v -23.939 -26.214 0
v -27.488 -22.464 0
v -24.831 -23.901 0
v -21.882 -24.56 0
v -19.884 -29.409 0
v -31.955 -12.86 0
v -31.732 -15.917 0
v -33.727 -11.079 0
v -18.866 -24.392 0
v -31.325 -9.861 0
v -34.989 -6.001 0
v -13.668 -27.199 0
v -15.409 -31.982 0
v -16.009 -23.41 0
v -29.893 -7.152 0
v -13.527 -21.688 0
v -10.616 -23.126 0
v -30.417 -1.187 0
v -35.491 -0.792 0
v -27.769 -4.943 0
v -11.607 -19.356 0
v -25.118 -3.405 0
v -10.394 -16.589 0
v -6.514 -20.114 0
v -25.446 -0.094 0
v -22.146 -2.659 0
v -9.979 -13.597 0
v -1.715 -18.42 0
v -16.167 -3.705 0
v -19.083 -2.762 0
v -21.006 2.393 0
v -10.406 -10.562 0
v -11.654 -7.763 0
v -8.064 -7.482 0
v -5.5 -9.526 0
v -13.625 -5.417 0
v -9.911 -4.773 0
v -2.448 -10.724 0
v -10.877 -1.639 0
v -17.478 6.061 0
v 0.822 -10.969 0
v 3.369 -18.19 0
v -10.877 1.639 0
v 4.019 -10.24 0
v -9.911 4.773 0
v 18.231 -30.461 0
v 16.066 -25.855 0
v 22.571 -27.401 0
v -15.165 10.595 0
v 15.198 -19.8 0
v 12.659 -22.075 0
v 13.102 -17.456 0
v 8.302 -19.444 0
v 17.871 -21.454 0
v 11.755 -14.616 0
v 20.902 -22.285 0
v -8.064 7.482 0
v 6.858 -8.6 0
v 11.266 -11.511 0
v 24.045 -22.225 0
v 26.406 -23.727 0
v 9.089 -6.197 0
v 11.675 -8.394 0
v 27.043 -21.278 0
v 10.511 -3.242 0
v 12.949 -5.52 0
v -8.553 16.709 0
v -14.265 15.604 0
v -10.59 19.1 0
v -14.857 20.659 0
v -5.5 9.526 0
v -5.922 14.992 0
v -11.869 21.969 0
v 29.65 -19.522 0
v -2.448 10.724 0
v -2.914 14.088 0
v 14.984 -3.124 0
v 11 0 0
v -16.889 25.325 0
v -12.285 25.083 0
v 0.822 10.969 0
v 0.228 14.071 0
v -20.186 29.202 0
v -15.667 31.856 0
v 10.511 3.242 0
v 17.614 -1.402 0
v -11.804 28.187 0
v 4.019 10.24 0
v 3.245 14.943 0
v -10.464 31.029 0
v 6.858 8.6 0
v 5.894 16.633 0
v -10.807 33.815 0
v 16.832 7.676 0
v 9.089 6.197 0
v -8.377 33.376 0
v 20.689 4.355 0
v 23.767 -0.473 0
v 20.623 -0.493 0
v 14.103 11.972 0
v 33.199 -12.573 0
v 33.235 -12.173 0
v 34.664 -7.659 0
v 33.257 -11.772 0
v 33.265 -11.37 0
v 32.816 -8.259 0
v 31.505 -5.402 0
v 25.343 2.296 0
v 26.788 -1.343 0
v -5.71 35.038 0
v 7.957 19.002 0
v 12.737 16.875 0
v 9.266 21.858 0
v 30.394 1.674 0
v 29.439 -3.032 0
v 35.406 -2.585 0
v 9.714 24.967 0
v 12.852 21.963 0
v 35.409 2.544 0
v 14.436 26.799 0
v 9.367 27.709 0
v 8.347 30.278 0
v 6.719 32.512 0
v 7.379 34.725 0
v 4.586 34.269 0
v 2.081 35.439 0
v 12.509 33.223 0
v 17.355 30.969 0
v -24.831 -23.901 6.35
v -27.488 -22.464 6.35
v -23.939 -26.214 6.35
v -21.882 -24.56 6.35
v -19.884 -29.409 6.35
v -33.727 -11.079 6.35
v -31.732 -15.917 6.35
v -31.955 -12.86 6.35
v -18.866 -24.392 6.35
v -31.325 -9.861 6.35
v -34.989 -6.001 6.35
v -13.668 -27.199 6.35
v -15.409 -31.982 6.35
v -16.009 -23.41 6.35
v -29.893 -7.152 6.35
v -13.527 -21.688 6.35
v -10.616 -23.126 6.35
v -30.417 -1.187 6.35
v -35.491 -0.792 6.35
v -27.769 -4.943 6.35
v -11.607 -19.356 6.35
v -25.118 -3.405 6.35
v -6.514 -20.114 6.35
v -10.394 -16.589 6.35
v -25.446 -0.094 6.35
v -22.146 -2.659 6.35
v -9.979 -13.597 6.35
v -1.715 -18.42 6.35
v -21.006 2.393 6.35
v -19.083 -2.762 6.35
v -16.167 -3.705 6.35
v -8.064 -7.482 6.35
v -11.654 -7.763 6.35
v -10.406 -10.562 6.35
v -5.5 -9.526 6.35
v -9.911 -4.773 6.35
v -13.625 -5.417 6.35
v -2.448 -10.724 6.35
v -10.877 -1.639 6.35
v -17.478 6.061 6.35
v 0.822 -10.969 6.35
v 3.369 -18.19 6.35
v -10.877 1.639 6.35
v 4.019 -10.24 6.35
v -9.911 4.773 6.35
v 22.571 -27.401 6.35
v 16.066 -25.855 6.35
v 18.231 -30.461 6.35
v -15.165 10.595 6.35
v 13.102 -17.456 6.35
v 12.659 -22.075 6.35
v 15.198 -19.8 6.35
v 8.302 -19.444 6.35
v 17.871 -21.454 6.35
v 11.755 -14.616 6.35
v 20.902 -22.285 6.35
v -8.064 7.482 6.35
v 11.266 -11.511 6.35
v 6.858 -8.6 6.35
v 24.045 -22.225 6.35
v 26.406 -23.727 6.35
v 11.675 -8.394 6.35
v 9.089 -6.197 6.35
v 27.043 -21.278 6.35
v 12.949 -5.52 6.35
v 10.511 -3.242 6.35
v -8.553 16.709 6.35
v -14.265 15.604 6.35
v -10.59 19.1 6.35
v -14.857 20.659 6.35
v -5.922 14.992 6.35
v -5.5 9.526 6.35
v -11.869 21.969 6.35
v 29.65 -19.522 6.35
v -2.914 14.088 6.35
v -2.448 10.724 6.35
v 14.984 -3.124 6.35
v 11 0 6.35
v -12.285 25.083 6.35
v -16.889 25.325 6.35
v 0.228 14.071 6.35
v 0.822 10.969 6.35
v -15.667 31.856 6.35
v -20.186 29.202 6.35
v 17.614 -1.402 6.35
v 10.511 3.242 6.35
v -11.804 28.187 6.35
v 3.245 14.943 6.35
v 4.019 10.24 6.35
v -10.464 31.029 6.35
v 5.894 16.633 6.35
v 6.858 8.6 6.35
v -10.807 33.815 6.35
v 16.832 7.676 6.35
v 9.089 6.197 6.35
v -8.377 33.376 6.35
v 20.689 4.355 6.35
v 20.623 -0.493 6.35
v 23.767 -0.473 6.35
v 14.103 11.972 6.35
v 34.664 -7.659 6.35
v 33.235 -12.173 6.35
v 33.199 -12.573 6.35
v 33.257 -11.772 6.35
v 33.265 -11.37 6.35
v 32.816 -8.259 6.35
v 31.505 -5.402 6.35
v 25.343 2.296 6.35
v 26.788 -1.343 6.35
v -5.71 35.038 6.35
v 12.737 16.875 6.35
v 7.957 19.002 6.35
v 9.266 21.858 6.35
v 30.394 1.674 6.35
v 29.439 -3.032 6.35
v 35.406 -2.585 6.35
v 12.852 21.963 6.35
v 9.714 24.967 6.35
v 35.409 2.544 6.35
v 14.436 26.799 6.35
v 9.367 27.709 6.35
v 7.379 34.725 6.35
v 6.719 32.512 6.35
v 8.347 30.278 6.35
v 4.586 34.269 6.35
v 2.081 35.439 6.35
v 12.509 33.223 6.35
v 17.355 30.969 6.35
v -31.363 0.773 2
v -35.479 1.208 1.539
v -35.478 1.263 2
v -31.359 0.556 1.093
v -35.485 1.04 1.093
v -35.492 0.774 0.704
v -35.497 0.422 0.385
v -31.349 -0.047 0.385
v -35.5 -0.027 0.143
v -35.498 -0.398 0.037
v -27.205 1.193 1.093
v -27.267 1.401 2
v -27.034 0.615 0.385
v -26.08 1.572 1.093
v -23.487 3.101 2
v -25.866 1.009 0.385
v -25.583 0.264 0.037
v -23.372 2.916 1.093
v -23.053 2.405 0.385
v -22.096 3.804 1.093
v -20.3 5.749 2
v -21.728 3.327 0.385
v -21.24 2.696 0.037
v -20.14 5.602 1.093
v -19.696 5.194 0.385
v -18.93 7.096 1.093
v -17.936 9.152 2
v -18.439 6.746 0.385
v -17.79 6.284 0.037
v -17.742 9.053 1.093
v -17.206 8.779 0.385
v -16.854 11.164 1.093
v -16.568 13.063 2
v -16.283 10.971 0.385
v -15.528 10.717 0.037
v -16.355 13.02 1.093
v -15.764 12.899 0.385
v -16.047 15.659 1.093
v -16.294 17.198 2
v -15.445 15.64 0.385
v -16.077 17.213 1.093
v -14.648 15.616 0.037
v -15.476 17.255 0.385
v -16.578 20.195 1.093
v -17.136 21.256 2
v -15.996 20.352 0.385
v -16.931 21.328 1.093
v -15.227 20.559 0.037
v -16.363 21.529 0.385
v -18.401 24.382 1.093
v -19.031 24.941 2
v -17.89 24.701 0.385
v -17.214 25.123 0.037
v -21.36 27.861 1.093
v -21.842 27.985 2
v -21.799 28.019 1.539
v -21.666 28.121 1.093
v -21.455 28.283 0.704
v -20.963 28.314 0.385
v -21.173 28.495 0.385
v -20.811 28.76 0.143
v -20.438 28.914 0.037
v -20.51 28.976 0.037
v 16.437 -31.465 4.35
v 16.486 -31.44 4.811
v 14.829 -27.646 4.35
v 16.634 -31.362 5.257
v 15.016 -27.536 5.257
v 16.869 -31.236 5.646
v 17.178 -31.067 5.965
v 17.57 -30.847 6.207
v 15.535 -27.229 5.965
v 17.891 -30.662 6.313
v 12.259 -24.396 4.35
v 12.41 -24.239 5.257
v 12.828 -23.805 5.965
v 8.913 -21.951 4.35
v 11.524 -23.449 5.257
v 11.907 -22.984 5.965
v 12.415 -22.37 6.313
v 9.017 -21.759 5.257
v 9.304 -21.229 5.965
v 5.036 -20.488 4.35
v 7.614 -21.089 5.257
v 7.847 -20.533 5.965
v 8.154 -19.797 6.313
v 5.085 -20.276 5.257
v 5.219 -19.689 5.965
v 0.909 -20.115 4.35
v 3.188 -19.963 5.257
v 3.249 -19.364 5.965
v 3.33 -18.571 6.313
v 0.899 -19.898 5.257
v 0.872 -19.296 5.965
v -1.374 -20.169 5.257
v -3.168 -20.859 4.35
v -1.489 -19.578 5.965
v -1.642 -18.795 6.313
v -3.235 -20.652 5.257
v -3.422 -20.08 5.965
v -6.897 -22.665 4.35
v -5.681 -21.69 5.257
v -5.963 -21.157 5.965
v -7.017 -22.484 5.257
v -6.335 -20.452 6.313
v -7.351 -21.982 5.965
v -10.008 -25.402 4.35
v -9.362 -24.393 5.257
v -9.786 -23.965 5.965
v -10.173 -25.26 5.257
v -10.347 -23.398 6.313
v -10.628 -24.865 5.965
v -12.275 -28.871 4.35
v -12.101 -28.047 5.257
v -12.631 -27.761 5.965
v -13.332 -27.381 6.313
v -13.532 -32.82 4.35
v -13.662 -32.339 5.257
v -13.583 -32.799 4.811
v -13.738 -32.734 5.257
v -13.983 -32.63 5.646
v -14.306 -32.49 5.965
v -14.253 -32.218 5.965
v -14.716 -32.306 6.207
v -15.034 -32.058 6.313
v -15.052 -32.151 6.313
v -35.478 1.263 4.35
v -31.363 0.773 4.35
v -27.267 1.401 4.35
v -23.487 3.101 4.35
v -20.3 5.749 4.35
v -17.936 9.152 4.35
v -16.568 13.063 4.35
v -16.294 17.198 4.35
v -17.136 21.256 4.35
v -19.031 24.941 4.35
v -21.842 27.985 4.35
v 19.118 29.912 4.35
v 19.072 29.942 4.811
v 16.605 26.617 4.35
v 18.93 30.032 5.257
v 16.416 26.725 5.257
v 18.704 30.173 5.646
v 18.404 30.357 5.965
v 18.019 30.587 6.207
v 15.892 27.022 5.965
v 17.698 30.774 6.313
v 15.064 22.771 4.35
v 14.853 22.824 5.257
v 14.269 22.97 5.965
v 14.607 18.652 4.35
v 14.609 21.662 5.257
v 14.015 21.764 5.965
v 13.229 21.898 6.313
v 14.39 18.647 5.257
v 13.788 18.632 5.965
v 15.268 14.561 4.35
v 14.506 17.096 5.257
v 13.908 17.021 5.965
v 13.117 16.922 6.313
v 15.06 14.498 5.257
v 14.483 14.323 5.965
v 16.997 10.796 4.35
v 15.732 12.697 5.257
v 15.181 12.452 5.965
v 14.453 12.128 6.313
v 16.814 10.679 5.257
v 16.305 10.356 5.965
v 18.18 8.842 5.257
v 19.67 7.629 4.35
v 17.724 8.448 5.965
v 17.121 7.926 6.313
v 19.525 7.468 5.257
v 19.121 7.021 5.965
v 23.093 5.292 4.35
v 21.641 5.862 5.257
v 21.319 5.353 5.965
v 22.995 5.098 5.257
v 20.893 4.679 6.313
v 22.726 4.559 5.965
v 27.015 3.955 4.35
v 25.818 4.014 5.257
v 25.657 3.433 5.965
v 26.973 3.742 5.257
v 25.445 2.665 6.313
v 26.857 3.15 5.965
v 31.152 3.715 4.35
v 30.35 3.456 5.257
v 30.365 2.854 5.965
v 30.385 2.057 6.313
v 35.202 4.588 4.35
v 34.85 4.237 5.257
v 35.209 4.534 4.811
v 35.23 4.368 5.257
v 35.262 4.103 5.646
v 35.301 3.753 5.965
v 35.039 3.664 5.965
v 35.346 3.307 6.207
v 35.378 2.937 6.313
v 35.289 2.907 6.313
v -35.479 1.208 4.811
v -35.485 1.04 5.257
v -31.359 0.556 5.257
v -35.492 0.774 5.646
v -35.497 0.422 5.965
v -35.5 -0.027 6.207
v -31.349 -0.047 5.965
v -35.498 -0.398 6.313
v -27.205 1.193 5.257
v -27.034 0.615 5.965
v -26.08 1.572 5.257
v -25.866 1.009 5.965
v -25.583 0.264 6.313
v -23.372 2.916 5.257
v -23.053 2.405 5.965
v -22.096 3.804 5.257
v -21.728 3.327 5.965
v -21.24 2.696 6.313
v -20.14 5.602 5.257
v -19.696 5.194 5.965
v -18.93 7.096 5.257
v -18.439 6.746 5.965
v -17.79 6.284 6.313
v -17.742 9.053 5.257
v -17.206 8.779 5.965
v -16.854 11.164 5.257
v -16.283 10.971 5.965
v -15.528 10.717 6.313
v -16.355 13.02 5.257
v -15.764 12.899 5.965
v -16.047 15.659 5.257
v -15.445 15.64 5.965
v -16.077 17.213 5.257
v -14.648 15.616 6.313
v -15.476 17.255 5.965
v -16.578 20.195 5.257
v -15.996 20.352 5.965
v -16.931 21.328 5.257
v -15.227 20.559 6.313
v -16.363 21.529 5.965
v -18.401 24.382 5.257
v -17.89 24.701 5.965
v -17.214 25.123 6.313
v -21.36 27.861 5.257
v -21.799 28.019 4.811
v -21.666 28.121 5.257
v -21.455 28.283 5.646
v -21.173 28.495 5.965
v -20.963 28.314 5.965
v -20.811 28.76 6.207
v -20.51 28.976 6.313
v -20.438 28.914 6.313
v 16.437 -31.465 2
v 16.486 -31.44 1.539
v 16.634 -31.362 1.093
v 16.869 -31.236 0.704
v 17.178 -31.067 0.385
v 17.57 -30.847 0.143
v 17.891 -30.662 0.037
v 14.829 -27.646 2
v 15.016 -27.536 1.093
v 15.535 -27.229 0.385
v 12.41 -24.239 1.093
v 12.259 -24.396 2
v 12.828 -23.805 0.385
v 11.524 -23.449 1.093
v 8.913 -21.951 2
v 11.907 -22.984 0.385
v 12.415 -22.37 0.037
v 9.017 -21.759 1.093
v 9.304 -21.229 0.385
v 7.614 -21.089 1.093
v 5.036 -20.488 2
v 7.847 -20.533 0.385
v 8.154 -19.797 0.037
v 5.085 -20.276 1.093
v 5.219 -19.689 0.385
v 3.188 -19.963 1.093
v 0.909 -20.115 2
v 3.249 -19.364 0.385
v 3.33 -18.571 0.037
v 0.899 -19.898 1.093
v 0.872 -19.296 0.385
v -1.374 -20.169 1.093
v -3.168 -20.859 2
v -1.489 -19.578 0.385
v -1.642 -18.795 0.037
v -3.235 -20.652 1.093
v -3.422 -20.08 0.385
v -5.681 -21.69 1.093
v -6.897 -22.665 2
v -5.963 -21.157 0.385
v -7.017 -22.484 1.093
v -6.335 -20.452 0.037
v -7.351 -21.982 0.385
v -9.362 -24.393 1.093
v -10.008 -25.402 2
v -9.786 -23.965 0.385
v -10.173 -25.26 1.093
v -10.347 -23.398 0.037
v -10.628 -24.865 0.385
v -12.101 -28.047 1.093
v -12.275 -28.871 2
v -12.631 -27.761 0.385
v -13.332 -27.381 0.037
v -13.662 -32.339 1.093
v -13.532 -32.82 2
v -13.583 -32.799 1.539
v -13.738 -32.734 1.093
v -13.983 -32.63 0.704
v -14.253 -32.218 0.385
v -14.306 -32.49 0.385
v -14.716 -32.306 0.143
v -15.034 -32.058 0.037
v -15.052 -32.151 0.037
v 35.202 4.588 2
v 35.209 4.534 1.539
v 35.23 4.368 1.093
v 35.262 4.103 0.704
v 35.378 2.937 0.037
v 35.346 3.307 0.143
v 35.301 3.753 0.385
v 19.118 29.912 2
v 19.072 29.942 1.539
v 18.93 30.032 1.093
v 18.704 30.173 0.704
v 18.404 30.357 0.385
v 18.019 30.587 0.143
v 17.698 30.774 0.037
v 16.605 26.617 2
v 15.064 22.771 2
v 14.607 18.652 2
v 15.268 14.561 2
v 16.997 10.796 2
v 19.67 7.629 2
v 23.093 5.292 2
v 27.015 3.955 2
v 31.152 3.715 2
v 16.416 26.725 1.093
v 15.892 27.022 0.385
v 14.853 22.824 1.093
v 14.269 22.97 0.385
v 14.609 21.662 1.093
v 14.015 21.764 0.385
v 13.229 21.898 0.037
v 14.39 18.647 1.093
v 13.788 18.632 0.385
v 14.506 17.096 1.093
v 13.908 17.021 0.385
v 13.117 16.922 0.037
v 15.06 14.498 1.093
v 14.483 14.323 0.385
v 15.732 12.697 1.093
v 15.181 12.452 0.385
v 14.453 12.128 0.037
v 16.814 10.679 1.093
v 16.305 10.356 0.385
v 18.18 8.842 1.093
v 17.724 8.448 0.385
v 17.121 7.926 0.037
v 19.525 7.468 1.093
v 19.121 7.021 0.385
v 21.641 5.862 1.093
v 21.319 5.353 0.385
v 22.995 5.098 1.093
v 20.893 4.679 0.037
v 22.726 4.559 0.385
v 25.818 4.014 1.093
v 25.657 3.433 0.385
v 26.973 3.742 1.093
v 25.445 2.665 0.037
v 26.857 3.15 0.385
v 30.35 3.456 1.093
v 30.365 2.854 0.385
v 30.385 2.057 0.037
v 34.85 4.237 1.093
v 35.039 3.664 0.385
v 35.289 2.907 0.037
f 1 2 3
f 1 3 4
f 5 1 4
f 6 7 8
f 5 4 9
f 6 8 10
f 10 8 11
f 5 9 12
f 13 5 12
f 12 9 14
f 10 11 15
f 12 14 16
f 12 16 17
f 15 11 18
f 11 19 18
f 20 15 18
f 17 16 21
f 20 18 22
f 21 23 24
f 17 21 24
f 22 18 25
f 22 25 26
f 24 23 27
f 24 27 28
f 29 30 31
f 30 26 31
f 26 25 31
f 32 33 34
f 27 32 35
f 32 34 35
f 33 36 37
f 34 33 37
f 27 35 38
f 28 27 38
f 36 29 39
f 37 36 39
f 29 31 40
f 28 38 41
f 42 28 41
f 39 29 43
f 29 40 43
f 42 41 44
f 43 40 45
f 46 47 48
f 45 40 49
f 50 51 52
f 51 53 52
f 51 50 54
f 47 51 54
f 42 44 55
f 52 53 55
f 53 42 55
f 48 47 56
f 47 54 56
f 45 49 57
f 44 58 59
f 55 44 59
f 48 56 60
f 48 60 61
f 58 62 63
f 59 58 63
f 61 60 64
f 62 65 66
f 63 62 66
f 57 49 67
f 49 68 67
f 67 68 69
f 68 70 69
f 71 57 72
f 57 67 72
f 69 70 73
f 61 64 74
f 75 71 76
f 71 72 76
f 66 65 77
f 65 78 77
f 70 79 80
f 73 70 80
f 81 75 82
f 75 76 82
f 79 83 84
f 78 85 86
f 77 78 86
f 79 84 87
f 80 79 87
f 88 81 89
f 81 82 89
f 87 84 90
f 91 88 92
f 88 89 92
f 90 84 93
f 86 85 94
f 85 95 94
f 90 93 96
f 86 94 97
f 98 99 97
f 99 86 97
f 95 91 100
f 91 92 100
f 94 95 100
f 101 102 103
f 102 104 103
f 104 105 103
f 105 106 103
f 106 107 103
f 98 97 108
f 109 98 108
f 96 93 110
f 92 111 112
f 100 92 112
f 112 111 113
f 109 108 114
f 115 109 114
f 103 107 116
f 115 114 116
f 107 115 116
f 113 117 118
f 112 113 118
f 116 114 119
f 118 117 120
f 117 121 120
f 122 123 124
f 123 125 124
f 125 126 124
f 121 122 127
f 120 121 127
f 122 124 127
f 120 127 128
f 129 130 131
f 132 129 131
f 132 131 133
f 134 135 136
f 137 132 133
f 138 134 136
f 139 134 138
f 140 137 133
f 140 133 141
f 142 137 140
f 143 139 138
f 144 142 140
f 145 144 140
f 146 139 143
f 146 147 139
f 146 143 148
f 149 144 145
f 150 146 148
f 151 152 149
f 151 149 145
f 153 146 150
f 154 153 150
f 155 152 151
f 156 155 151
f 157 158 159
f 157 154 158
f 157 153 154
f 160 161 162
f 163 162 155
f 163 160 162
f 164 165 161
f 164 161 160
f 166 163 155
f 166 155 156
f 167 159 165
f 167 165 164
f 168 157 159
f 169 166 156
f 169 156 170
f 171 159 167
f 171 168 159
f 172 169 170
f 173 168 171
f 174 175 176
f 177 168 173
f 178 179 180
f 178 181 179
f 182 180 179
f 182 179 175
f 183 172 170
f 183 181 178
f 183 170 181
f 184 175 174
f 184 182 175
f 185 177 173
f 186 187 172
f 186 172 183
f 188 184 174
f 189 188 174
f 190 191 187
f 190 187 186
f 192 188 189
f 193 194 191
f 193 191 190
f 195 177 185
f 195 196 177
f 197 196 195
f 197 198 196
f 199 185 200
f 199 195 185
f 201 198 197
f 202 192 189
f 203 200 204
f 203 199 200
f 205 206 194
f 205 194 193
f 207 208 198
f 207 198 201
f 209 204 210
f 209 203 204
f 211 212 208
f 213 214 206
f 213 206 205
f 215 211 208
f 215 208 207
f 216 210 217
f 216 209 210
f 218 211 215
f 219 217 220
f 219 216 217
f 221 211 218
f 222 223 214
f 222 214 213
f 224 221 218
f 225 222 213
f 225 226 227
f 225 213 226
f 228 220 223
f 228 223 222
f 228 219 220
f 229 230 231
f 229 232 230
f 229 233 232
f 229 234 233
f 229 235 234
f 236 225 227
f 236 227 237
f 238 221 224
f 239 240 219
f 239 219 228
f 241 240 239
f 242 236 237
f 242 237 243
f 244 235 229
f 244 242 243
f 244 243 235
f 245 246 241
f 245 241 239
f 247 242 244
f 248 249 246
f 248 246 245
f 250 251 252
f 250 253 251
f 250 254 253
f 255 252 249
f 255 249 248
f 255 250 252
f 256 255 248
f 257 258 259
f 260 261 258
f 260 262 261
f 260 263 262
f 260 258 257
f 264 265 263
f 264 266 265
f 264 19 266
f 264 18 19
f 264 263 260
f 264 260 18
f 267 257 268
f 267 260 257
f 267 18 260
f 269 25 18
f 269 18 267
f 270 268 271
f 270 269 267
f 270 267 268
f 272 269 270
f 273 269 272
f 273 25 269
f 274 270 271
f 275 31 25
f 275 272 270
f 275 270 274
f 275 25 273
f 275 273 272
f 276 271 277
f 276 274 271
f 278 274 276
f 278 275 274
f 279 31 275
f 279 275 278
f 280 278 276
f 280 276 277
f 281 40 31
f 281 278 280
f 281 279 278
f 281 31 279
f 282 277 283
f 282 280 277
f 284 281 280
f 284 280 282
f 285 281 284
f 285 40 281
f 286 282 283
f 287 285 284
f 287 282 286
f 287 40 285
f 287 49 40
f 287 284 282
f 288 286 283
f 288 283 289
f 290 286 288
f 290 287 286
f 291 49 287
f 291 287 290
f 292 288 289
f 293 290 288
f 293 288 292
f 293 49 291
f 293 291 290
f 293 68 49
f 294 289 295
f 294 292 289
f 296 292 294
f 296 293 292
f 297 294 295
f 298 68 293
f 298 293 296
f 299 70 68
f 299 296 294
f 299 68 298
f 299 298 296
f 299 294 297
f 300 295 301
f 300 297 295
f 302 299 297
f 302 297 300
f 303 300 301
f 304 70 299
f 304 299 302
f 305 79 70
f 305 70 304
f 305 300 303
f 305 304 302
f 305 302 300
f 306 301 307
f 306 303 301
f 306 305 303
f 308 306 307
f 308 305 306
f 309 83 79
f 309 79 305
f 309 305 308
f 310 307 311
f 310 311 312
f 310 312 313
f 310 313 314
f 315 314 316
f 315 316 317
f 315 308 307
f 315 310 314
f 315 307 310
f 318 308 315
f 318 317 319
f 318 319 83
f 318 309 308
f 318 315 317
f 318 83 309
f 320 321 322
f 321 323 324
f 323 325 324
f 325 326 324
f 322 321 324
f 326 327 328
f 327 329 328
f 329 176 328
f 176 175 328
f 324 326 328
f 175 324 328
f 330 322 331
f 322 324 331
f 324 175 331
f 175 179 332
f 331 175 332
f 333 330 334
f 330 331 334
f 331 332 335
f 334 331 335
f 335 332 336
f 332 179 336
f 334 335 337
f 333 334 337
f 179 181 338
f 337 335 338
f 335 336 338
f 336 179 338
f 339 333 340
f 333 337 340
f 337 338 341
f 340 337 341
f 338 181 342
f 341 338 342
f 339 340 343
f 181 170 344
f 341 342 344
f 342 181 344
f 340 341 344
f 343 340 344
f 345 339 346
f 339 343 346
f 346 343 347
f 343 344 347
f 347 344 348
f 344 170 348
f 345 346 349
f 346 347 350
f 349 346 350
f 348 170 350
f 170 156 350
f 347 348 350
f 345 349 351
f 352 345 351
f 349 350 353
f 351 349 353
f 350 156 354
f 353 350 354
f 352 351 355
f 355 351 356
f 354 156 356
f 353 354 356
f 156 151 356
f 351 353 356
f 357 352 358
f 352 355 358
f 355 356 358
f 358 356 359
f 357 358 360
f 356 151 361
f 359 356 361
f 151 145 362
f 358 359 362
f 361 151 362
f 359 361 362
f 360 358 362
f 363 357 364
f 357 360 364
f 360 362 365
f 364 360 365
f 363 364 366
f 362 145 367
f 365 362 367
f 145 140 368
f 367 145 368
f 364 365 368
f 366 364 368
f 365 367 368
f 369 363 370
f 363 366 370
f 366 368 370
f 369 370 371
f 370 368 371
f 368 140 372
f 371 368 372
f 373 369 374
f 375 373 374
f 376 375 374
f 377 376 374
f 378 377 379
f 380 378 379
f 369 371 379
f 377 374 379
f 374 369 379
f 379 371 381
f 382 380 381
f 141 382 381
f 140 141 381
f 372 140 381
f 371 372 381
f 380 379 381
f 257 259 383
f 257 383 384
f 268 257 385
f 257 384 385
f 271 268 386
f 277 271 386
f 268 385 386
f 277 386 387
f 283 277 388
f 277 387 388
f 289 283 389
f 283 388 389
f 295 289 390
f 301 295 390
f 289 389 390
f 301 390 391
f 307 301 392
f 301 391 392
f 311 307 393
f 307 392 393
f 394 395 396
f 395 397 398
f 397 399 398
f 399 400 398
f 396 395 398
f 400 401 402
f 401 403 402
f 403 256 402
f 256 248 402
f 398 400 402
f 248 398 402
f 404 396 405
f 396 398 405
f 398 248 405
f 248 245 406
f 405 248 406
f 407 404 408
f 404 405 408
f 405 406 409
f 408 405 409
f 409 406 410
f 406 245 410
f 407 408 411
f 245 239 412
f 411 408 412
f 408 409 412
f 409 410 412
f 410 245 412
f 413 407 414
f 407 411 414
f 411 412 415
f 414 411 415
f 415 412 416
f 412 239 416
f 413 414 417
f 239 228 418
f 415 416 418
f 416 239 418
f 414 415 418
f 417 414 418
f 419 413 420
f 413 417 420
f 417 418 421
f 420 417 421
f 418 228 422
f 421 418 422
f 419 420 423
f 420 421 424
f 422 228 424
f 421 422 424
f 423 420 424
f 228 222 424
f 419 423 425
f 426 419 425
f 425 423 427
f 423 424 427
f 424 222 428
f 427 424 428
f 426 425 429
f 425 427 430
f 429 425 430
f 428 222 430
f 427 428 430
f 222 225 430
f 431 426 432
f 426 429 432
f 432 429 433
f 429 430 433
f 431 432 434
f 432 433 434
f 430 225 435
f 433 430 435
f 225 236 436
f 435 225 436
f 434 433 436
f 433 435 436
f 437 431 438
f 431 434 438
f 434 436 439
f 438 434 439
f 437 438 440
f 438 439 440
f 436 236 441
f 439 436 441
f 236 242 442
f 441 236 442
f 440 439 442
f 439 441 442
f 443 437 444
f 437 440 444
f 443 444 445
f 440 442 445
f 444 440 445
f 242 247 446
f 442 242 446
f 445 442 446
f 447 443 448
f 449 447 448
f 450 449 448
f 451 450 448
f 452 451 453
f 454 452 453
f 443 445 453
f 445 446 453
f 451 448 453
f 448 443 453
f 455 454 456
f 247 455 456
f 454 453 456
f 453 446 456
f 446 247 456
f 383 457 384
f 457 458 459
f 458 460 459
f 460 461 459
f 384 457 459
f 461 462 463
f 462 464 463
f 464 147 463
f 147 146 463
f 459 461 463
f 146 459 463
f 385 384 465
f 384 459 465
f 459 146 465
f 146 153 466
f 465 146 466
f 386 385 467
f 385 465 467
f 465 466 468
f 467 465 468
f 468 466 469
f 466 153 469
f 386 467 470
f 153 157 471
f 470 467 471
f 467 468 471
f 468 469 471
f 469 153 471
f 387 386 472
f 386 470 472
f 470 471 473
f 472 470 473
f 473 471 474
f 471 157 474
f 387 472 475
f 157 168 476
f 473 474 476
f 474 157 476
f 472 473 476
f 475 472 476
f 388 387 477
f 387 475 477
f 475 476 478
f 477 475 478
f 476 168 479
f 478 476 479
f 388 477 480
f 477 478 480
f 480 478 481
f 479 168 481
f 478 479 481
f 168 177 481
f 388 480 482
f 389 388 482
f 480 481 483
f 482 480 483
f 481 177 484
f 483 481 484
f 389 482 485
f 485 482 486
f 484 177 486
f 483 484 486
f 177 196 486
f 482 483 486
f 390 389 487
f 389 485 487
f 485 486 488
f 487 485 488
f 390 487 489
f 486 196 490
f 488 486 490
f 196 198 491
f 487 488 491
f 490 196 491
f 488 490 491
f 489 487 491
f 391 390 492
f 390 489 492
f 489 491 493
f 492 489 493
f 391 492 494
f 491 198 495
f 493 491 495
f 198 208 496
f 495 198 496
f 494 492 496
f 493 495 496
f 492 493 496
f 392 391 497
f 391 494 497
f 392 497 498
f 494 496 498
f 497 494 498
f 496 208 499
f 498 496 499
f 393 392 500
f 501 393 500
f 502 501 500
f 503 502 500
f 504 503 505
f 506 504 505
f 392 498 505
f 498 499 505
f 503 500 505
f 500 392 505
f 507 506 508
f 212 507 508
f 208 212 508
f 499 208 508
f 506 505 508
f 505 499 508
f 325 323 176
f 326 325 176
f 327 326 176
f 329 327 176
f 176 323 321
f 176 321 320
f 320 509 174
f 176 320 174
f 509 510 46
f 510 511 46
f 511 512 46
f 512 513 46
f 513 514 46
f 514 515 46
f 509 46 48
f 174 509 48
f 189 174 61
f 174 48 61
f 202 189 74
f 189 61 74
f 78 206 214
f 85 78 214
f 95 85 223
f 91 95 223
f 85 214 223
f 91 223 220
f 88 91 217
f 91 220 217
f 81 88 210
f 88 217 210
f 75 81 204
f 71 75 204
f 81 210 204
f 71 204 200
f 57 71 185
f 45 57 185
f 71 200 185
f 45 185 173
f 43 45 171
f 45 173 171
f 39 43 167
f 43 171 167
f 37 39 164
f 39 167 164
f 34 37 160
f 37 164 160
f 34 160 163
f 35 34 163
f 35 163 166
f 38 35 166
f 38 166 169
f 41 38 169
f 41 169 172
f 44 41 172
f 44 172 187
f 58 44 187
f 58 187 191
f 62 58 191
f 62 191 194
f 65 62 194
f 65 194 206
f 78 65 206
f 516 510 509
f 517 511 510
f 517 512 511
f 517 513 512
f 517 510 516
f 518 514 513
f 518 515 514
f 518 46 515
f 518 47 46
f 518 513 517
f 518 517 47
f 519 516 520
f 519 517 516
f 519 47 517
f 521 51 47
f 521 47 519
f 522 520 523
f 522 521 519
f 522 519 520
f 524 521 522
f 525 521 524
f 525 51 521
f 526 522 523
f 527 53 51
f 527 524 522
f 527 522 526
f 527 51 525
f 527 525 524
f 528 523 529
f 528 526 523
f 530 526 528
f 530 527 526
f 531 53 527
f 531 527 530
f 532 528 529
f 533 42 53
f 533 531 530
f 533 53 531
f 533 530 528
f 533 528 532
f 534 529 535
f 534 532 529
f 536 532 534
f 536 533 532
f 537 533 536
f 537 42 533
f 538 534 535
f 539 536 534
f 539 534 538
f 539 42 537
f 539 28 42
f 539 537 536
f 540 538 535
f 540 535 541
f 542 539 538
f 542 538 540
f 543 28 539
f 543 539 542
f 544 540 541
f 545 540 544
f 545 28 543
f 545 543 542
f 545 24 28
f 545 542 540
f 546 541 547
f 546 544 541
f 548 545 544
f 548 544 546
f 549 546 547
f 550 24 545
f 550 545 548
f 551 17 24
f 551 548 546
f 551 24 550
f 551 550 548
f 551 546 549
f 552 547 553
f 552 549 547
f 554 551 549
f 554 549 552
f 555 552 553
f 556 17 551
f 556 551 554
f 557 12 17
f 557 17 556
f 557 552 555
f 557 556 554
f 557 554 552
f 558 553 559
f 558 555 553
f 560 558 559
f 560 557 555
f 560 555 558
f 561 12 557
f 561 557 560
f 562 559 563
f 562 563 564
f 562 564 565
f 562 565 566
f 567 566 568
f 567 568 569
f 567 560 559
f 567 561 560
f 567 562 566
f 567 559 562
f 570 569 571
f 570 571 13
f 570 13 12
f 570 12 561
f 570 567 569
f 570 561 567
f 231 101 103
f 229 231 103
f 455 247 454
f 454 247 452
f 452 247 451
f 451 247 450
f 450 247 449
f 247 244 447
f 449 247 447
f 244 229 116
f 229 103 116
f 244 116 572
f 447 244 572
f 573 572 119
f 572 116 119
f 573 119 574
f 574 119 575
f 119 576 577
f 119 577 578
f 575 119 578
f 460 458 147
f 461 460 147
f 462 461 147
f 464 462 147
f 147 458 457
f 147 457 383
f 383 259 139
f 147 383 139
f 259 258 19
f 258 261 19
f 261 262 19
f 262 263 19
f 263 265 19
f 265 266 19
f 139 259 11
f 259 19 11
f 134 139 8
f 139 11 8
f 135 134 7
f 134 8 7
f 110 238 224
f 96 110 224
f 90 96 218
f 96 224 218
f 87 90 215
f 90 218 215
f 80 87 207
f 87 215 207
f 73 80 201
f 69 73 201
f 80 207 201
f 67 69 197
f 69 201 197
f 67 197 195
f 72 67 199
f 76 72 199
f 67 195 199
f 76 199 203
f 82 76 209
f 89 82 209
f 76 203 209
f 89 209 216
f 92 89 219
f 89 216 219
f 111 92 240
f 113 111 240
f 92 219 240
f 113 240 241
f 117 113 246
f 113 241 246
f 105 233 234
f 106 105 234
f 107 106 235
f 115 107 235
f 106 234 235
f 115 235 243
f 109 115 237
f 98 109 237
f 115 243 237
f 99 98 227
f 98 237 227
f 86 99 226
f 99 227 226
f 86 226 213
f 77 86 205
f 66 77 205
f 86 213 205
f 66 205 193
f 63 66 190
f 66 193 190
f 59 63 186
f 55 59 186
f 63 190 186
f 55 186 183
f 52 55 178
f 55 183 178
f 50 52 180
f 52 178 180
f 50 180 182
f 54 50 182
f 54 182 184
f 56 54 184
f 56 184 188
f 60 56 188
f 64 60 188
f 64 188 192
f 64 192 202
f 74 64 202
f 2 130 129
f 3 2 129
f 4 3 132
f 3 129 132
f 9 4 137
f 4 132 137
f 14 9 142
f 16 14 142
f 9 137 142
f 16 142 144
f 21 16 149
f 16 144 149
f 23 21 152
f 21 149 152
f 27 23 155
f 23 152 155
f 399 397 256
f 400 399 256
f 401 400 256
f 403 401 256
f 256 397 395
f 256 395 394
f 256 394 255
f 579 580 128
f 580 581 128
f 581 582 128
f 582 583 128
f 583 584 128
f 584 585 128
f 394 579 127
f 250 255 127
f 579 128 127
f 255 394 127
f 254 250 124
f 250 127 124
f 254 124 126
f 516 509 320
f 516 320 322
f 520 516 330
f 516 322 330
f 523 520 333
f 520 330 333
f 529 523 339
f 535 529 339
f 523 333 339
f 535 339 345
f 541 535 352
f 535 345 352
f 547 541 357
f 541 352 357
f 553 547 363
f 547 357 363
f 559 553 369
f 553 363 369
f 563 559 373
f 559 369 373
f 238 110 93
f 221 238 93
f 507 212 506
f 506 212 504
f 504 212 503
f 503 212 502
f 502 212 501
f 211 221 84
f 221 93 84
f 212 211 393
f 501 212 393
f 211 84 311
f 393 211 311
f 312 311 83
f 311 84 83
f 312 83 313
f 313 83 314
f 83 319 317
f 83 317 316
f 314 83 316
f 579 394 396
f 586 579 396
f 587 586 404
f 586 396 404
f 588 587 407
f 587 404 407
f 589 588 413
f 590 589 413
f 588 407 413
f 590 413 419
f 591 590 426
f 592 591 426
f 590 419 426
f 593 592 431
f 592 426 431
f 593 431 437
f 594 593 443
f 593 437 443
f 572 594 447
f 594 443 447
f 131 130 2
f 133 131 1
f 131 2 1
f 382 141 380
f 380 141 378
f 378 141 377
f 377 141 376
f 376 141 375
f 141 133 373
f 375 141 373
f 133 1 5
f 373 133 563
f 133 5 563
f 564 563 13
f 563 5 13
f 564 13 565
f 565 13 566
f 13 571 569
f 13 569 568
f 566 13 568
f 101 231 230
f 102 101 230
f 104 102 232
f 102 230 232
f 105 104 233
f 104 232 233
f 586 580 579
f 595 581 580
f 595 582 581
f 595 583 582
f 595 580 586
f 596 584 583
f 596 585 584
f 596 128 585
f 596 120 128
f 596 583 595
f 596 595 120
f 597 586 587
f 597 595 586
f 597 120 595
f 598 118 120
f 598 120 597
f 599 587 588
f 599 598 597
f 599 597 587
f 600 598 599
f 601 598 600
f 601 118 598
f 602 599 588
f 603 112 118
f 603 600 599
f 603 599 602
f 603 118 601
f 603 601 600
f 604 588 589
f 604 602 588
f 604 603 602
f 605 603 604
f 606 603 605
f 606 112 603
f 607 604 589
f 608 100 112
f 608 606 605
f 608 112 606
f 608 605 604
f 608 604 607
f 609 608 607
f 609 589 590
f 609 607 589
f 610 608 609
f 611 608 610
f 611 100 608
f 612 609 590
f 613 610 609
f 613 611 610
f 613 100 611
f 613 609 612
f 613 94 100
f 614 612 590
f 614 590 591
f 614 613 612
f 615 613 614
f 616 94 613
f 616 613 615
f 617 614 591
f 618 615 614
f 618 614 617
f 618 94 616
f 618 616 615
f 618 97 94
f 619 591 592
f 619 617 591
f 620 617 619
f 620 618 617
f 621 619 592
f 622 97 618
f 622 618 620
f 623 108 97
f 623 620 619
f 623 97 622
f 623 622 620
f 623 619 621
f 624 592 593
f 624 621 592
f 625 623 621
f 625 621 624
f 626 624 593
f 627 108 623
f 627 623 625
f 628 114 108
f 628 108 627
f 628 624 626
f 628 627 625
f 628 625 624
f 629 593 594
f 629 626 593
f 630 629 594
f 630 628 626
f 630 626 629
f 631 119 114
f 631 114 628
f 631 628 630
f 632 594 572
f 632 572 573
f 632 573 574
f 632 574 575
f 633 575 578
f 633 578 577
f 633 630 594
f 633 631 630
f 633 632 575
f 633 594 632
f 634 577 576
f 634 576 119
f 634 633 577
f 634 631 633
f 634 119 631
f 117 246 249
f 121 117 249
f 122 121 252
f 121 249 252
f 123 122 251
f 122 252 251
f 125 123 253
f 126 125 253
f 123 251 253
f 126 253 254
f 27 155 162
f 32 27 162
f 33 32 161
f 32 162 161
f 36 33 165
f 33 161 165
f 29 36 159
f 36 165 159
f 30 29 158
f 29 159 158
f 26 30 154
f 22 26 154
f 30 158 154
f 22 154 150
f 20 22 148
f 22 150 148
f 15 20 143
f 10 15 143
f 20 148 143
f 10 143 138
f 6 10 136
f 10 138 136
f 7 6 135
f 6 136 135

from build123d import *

# Parameters (mm, degrees)
F0_R     = 35.5
F1_DEPTH = 6.35
F2_R     = 11
F3_DEPTH = 45.4
F4_R     = 2


with BuildPart() as f1:
    # F0 (on Top) → F1 (new body)
    with BuildSketch(Plane.XY):
        Circle(F0_R)
    extrude(amount=F1_DEPTH)

    # F2 (on face) → F3 (cut)
    with BuildSketch(Plane.XY.offset(6.35)):
        with BuildLine():
            ThreePointArc((-35.4775348505, 1.2627434137), (-17.9359739533, 9.1519318989), (-21.842331384, 27.9850417136))
            ThreePointArc((-21.842331384, 27.9850417136), (-31.6213863215, 16.1349907687), (-35.4775348505, 1.2627434137))
        make_face()
        with BuildLine():
            ThreePointArc((-5.7104578794, 35.0377035607), (-1.8255507227, 35.4530304002), (2.0814687386, 35.4389261673))
            ThreePointArc((2.0814687386, 35.4389261673), (-1.8512627047, 35.9523688566), (-5.7104578794, 35.0377035607))
        make_face()
        with BuildLine():
            ThreePointArc((-5.7104578794, 35.0377035607), (-7.2991901005, 15.7562375394), (9.7144008995, 24.9669228171))
            ThreePointArc((9.7144008995, 24.9669228171), (7.6036569491, 31.4462072594), (2.0814687386, 35.4389261673))
            ThreePointArc((2.0814687386, 35.4389261673), (-1.8255507227, 35.4530304002), (-5.7104578794, 35.0377035607))
        make_face()
        Circle(F2_R)
        with BuildLine():
            ThreePointArc((35.2022114799, 4.58849724), (29.9665998499, 19.032942322), (19.1180348698, 29.9123844372))
            ThreePointArc((19.1180348698, 29.9123844372), (16.9973621306, 10.7956796793), (35.2022114799, 4.58849724))
        make_face()
        with BuildLine():
            ThreePointArc((29.6502759744, -19.5220678884), (32.0612961084, -16.3729438969), (33.1987703135, -12.5734501895))
            ThreePointArc((33.1987703135, -12.5734501895), (31.6160003291, -16.1455418984), (29.6502759744, -19.5220678884))
        make_face()
        with BuildLine():
            ThreePointArc((29.6502759744, -19.5220678884), (31.6160003291, -16.1455418984), (33.1987703135, -12.5734501895))
            ThreePointArc((33.1987703135, -12.5734501895), (33.2482719009, -11.9726798636), (33.2647889641, -11.3700999284))
            ThreePointArc((33.2647889641, -11.3700999284), (12.2089360139, -6.9114205899), (29.6502759744, -19.5220678884))
        make_face()
        with BuildLine():
            ThreePointArc((16.4372598805, -31.465321985), (0.9090375797, -20.1154336224), (-13.5321534944, -32.8196712629))
            ThreePointArc((-13.5321534944, -32.8196712629), (1.6026466455, -35.4638058269), (16.4372598805, -31.465321985))
        make_face()
        with BuildLine():
            ThreePointArc((-27.4883124341, -22.4642533712), (-29.7904496064, -19.3074885019), (-31.731744713, -15.9168582789))
            ThreePointArc((-31.731744713, -15.9168582789), (-30.2100334037, -19.5794249596), (-27.4883124341, -22.4642533712))
        make_face()
        with BuildLine():
            ThreePointArc((-9.9791898636, -13.5968228886), (-22.1457867643, -2.6588591078), (-31.731744713, -15.9168582789))
            ThreePointArc((-31.731744713, -15.9168582789), (-29.7904496064, -19.3074885019), (-27.4883124341, -22.4642533712))
            ThreePointArc((-27.4883124341, -22.4642533712), (-16.009297927, -23.4100881015), (-9.9791898636, -13.5968228886))
        make_face()
    extrude(amount=-F3_DEPTH, mode=Mode.SUBTRACT)

    # F4
    f4_edges = [f1.edges().sort_by_distance(p)[0] for p in [
        (-17.935974, 9.151932, 0),
        (-17.935974, 9.151932, 6.35),
        (16.997362, 10.79568, 0),
        (16.997362, 10.79568, 6.35),
        (0.909038, -20.115434, 0),
        (0.909038, -20.115434, 6.35),
    ]]
    fillet(f4_edges, radius=F4_R)


solid = f1.part
